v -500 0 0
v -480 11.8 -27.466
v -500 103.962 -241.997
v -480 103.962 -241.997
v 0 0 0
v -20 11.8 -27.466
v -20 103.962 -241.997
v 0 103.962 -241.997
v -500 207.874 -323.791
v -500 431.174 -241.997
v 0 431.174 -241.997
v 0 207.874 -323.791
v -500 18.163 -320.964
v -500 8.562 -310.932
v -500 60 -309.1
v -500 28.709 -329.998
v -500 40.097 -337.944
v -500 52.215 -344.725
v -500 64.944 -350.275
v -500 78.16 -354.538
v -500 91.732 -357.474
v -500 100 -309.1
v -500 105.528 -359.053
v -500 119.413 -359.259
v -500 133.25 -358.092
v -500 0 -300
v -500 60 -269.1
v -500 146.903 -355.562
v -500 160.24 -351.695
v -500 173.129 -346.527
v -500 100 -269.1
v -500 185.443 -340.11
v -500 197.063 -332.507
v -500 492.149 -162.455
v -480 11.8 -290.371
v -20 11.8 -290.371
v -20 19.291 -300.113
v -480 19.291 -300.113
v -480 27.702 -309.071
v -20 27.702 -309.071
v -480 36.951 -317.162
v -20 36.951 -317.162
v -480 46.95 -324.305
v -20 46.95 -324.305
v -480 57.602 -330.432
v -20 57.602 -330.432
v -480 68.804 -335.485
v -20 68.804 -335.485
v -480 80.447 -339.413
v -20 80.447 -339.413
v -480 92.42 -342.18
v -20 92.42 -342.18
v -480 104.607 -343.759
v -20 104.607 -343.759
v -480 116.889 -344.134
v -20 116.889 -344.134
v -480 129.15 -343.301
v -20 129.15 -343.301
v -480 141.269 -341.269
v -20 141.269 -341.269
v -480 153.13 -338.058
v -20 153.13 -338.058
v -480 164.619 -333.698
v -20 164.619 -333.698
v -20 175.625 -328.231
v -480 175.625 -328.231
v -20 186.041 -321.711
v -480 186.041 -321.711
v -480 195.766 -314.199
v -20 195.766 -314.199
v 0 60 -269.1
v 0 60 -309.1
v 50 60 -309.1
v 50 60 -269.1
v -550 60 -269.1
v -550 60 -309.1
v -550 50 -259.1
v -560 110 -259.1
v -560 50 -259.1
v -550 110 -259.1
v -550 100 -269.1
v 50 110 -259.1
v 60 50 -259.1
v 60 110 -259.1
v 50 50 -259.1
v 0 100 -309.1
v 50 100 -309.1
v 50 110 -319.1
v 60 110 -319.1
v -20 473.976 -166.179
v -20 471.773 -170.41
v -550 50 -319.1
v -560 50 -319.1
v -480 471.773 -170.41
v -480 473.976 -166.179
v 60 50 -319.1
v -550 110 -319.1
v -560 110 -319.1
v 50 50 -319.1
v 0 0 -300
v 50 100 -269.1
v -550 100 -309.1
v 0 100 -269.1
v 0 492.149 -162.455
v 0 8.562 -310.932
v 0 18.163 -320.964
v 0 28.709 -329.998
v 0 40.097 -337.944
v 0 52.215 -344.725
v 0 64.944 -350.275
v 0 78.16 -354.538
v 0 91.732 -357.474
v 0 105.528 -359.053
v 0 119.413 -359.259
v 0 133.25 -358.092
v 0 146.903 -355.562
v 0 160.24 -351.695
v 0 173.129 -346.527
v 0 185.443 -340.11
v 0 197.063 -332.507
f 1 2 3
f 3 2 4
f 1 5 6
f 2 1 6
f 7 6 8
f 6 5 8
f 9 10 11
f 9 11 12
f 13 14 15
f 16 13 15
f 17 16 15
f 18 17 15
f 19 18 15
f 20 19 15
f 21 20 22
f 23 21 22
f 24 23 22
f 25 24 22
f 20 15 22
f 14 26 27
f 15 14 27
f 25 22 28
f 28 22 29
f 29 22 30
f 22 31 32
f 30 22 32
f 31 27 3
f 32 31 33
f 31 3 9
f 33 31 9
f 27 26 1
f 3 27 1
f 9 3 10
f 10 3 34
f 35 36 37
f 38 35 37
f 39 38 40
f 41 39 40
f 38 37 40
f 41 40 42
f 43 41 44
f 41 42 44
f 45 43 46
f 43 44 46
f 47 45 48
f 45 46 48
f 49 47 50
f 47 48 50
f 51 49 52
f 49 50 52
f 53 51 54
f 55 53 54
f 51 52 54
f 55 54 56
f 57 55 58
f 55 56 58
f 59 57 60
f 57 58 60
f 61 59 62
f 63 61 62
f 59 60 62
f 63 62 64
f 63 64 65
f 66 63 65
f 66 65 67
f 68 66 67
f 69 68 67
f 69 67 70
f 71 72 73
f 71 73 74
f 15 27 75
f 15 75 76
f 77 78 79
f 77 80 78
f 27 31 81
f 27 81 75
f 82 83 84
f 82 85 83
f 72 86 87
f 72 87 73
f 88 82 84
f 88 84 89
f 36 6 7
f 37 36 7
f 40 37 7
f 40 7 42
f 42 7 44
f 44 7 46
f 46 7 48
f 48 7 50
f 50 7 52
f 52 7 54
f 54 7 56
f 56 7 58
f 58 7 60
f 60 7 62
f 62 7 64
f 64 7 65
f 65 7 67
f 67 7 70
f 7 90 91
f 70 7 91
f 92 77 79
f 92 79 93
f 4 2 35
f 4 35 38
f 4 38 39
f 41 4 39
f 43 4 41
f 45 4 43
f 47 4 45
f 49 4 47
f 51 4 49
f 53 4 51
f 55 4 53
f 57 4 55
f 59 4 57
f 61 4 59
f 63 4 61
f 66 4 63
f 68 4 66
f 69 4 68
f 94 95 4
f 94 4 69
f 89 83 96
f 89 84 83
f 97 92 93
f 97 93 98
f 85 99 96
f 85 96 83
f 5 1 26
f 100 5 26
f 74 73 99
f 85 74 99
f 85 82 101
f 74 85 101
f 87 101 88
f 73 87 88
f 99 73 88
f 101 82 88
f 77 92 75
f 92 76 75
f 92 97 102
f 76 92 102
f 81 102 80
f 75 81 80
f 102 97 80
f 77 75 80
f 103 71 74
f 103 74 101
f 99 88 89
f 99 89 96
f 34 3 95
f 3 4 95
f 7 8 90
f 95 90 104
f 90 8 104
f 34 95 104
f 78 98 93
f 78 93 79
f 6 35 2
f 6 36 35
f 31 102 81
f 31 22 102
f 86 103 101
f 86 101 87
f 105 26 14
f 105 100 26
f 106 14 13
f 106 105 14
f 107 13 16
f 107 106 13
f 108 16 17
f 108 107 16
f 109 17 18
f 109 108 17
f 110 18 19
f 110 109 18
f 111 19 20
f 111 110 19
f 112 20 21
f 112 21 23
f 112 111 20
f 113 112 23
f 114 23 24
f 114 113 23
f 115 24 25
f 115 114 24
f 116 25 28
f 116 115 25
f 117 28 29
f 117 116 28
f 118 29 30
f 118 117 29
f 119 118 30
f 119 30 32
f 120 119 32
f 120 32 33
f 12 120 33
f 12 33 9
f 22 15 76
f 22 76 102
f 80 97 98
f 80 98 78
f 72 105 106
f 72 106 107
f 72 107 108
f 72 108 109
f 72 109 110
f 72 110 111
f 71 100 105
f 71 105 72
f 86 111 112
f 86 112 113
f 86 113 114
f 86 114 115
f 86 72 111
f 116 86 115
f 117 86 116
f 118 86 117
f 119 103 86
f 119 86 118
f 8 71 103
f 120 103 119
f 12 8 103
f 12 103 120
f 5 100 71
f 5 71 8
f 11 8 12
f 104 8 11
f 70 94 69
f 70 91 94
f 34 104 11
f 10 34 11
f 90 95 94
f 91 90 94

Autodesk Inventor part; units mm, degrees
ref_plane "YZ Plane" through (0, 0, 0) normal (1, 0, 0) x (0, 1, 0)
ref_plane "XZ Plane" through (0, 0, 0) normal (0, 1, 0) x (-1, 0, 0)
sketch "Sketch1" plane through (0, 0, 0) normal (1, 0, 0) x (0, 1, 0)
  line L0 (0, 0) -> (0, -300)
  line L1 (0, 0) -> (103.9616, -241.9966)
  line L2 (431.1742, -241.9966) -> (207.8735, -323.7914)
  arc A0 (0, -300) -> (207.8735, -323.7914) centre (114.5573, -219.1004) ccw
  line L3 (103.9616, -241.9966) -> (492.1494, -162.4552)
  line L4 (492.1494, -162.4552) -> (431.1742, -241.9966)
  dimension "d5" = 300
extrude "Extrusion1" add sketch "Sketch1" against normal blind 500
ref_plane "Work Plane1" through (-20, 0, 0) normal (1, 0, 0) x (0, 0, -1)
sketch "Sketch2" plane through (-20, 0, 0) normal (1, 0, 0) x (0, 0, -1)
  line L0 (292.8468, 11.7995) -> (-65.8674, 11.7995)
  line L1 (170.4104, 471.7728) -> (314.1993, 195.7664)
  arc A0 (290.3714, 11.7995) -> (314.1993, 195.7664) centre (219.1004, 114.5573) ccw
  arc A1 (300, 0) -> (323.7914, 207.8735) centre (219.1004, 114.5573) ccw projected
  line L2 (-61.2921, 11.7995) -> (-54.1186, 588.7001)
  line L3 (-54.1186, 588.7001) -> (170.4104, 471.7728)
  point P0 (0, 0)
  dimension "d9" = 250.1097
extrude "Extrusion2" cut sketch "Sketch2" against normal blind 460
sketch "Sketch3" plane through (0, 0, 0) normal (1, 0, 0) x (0, 0, -1)
  line L0 (269.1004, 100) -> (309.1004, 100)
  line L1 (309.1004, 100) -> (309.1004, 60)
  line L2 (309.1004, 60) -> (269.1004, 60)
  line L3 (269.1004, 60) -> (269.1004, 100)
  line L4 (0, 0) -> (300, 0) projected
  arc A0 (300, 0) -> (323.7914, 207.8735) centre (219.1004, 114.5573) ccw projected
  dimension "d12" = 40
  dimension "d13" = 40
  dimension "d14" = 60
  dimension "d15" = 90
extrude "Extrusion3" add sketch "Sketch3" along normal blind 50
sketch "Sketch4" plane through (50, 0, 0) normal (1, 0, 0) x (0, 0, -1)
  line L0 (309.1004, 100) -> (269.1004, 100) projected
  line L1 (269.1004, 100) -> (269.1004, 60) projected
  line L2 (269.1004, 60) -> (309.1004, 60) projected
  line L3 (309.1004, 60) -> (309.1004, 100) projected
  line L4 (259.1004, 110) -> (319.1004, 110)
  line L5 (319.1004, 110) -> (319.1004, 50)
  line L6 (319.1004, 50) -> (259.1004, 50)
  line L7 (259.1004, 50) -> (259.1004, 110)
  point P0 (0, 0)
  dimension "d18" = 60
  dimension "d19" = 60
  dimension "d20" = 10
  dimension "d21" = 10
extrude "Extrusion4" add sketch "Sketch4" along normal blind 10 contours L3 L2 L1 L0 | L4 L5 L6 L7
sketch "Sketch5" plane through (-500, 0, 0) normal (-1, 0, 0) x (0, 0, 1)
  line L0 (-309.1004, 100) -> (-269.1004, 100)
  line L1 (-269.1004, 100) -> (-269.1004, 60)
  line L2 (-269.1004, 60) -> (-309.1004, 60)
  line L3 (-309.1004, 60) -> (-309.1004, 100)
  arc A0 (-323.7914, 207.8735) -> (-300, 0) centre (-219.1004, 114.5573) ccw projected
  line L4 (-300, 0) -> (0, 0) projected
  dimension "d24" = 40
  dimension "d25" = 40
  dimension "d26" = 90
  dimension "d27" = 60
extrude "Extrusion5" add sketch "Sketch5" along normal blind 50
sketch "Sketch6" plane through (-550, 0, 0) normal (-1, 0, 0) x (0, 0, 1)
  point P0 (0, 0)
sketch "Sketch7" plane through (-550, 0, 0) normal (-1, 0, 0) x (0, 0, 1)
  point P0 (0, 0)
sketch "Sketch8" plane through (-550, 0, 0) normal (-1, 0, 0) x (0, 0, 1)
  line L0 (-269.1004, 100) -> (-309.1004, 100) projected
  line L1 (-309.1004, 100) -> (-309.1004, 60) projected
  line L2 (-309.1004, 60) -> (-269.1004, 60) projected
  line L3 (-269.1004, 60) -> (-269.1004, 100) projected
  line L4 (-319.1004, 110) -> (-259.1004, 110)
  line L5 (-259.1004, 110) -> (-259.1004, 50)
  line L6 (-259.1004, 50) -> (-319.1004, 50)
  line L7 (-319.1004, 50) -> (-319.1004, 110)
  point P0 (0, 0)
  dimension "d30" = 60
  dimension "d31" = 60
  dimension "d33" = 10
  dimension "d34" = 10
extrude "Extrusion6" add sketch "Sketch8" along normal blind 10 contours L3 L2 L1 L0 | L4 L5 L6 L7
properties part number "hoe me"
